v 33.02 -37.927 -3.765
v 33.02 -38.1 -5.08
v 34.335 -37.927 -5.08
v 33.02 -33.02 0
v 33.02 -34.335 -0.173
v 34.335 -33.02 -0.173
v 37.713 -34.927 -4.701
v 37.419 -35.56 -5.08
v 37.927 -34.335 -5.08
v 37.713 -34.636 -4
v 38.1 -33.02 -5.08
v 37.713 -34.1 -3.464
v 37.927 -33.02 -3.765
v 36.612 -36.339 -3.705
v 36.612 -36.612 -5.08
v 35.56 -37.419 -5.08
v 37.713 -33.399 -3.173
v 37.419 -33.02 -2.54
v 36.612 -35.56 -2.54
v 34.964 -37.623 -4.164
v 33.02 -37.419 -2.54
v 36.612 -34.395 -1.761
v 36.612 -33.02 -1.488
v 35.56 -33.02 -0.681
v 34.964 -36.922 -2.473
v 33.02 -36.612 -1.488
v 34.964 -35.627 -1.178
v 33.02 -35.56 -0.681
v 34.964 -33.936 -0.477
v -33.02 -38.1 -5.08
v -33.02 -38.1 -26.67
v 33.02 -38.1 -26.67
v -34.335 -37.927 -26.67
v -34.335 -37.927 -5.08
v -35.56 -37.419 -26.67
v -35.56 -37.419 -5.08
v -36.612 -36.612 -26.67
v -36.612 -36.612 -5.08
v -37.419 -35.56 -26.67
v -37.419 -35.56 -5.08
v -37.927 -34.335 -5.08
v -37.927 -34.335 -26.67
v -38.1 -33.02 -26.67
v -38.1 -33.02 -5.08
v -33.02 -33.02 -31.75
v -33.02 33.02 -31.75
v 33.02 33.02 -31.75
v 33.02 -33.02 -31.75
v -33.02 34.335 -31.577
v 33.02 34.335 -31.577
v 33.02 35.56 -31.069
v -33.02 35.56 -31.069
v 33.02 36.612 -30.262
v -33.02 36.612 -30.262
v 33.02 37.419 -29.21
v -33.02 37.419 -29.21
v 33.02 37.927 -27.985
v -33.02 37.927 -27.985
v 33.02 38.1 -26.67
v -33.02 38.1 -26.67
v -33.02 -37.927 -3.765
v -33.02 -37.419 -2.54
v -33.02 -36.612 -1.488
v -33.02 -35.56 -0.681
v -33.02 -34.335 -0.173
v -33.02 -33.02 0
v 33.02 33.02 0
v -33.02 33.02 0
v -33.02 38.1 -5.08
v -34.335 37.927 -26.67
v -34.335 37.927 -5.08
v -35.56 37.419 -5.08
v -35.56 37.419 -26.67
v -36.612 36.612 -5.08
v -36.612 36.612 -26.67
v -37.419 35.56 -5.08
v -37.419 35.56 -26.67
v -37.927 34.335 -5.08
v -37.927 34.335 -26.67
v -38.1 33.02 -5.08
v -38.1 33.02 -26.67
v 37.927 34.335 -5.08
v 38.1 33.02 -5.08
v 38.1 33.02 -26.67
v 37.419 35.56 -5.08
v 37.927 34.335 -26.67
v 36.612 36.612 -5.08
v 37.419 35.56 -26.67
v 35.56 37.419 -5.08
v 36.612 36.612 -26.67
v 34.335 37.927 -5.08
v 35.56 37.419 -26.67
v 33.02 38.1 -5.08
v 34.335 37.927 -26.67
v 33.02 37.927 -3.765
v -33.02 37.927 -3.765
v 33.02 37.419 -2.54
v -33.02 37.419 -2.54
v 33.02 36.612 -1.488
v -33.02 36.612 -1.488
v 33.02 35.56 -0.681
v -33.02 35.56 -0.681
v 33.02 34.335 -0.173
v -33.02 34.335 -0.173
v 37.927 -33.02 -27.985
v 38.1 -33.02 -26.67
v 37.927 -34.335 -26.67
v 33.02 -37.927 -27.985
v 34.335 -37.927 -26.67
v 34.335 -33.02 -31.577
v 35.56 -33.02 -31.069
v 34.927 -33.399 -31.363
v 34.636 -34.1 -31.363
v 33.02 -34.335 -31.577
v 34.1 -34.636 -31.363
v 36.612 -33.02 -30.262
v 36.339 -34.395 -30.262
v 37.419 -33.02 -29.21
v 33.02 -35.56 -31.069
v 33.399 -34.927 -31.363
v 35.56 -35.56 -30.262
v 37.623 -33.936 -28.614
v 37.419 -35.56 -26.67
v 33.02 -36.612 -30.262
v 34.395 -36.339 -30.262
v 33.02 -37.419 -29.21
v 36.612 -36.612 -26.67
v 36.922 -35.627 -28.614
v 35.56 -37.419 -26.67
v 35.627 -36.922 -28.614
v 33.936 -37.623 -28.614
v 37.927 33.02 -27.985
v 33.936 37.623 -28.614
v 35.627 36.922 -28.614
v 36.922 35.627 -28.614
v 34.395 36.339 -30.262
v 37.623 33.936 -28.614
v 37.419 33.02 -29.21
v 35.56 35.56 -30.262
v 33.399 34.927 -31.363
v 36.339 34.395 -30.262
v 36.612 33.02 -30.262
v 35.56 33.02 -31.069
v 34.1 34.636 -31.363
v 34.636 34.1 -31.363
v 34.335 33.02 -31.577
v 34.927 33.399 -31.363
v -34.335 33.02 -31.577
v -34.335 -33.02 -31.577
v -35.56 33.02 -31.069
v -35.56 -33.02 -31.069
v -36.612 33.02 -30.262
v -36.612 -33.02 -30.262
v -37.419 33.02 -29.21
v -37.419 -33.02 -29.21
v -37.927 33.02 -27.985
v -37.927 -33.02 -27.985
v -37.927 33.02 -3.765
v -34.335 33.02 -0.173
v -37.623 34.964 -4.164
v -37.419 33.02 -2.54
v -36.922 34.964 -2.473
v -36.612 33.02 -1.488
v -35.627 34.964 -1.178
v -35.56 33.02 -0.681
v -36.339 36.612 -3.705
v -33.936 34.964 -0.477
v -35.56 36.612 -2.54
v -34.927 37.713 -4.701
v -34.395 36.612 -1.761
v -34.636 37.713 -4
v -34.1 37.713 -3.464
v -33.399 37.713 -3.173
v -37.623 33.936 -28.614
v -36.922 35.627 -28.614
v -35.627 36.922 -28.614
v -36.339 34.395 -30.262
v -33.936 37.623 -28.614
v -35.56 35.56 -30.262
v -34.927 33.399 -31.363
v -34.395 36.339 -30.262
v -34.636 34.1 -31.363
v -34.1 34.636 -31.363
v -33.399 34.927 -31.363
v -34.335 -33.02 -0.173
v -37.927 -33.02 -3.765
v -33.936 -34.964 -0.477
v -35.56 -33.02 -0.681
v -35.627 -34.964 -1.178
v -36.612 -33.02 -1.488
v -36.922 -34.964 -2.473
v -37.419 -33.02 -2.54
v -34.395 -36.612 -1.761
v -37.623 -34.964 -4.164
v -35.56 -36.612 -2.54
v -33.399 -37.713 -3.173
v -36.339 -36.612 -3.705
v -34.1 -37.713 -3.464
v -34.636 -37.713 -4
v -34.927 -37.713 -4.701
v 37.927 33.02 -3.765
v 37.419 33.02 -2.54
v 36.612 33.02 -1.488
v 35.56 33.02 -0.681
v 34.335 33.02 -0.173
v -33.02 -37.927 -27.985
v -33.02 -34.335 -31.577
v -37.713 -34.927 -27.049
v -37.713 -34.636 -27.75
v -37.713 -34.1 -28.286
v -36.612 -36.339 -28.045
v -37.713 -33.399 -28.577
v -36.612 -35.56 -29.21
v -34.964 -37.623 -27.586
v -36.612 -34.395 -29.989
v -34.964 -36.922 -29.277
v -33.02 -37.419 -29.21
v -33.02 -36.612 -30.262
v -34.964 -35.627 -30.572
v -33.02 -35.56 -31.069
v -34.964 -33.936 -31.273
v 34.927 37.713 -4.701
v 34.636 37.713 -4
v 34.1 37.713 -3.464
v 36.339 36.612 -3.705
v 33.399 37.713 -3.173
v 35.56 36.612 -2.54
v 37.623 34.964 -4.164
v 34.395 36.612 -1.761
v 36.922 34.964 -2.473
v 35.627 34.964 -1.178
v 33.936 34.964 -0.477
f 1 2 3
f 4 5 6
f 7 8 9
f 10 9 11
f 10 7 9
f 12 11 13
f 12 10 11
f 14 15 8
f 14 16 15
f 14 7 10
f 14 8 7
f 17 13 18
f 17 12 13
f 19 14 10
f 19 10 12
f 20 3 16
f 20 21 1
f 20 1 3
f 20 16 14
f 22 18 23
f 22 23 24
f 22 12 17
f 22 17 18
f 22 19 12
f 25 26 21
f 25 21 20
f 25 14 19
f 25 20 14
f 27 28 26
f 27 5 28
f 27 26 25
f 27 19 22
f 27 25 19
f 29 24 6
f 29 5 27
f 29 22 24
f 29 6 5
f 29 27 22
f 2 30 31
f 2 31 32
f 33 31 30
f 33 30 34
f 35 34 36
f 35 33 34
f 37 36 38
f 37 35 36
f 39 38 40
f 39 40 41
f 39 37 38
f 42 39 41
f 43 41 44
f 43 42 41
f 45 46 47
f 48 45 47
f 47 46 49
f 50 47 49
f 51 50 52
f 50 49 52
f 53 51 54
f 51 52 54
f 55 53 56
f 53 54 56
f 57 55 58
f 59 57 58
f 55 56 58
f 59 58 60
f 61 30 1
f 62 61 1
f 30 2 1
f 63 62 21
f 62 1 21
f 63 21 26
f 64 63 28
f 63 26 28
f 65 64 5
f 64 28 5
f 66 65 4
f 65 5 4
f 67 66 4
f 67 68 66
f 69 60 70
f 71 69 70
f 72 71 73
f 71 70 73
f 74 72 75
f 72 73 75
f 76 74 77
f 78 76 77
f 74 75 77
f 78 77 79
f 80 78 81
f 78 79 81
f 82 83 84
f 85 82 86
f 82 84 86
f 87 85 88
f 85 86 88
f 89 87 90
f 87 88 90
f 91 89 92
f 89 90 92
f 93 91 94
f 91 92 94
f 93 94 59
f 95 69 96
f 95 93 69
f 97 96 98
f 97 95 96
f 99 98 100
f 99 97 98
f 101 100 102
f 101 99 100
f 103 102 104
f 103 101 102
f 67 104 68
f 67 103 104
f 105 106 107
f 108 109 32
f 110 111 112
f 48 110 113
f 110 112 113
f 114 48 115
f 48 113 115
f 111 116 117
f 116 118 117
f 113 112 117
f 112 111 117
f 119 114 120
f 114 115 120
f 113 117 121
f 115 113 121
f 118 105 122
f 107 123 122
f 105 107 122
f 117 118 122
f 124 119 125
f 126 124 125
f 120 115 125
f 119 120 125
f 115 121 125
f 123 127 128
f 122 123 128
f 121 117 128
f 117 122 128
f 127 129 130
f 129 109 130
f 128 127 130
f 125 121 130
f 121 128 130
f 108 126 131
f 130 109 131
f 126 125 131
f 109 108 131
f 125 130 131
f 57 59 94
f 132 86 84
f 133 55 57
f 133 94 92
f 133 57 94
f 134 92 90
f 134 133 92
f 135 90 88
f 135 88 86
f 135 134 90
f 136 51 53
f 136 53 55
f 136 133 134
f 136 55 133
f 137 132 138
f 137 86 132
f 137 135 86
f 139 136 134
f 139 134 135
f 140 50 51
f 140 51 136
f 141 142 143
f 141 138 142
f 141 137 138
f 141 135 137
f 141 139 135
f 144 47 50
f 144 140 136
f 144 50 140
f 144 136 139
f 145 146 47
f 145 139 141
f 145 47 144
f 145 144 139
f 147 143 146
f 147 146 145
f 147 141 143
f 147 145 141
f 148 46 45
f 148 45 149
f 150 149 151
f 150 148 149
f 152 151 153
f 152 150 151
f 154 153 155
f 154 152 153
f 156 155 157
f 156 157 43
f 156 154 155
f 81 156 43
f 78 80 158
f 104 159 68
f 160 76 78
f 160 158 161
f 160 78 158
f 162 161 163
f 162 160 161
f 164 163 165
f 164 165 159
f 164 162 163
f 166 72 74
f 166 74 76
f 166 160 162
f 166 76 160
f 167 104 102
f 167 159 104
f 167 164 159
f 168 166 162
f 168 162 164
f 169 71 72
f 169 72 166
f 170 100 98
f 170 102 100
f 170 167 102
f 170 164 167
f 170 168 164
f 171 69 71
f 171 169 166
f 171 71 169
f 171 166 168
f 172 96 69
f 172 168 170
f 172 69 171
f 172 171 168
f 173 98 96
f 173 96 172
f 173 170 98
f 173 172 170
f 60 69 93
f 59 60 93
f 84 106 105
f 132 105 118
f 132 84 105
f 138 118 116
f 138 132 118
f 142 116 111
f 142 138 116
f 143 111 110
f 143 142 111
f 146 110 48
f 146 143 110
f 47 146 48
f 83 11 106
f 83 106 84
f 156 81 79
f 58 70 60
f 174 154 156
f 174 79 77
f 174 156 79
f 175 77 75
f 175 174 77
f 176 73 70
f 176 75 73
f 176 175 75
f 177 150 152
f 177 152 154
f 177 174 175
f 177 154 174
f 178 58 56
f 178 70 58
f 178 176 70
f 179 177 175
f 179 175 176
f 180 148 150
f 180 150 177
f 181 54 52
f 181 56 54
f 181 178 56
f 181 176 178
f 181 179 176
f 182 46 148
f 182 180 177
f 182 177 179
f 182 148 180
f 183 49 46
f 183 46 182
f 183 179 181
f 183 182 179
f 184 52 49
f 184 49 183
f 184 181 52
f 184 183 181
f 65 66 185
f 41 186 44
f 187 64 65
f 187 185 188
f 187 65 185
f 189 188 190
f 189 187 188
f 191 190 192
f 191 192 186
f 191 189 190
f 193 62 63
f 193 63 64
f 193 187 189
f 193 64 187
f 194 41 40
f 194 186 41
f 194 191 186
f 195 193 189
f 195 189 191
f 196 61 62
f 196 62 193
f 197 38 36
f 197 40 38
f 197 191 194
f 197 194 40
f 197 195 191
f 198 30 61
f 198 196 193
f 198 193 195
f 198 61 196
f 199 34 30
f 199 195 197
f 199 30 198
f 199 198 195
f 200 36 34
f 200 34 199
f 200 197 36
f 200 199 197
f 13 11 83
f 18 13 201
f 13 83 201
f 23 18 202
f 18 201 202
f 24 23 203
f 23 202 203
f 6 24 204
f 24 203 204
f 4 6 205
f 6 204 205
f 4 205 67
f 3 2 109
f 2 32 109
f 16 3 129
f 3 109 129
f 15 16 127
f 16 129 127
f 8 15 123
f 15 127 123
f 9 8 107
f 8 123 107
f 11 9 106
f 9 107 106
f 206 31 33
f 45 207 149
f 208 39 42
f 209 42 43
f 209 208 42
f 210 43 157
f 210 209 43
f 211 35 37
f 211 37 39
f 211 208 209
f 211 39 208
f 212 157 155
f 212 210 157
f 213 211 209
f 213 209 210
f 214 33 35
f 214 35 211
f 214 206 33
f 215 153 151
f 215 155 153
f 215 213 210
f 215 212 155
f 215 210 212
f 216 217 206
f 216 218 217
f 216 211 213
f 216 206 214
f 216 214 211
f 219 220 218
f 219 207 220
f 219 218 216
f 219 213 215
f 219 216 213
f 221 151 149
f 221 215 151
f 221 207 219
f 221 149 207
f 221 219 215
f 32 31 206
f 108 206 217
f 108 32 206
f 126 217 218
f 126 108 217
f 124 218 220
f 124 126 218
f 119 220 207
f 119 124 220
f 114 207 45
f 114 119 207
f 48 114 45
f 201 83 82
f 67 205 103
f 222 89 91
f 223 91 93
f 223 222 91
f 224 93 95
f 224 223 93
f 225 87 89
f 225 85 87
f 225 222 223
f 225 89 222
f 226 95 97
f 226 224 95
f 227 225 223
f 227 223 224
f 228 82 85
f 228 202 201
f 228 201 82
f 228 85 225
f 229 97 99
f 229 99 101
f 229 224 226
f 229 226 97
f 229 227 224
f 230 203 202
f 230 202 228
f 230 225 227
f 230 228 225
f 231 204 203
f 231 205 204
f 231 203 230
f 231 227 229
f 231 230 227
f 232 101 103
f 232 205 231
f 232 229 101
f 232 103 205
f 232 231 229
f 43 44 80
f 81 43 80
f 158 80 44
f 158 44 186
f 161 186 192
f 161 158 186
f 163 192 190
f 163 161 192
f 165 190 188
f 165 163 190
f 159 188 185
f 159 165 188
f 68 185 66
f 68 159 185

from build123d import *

# Parameters (mm, degrees)
F0_W         = 76.2
F0_H         = 76.2
F1_DEPTH     = 31.75
F2_R         = 5.08
F3_T1_DEPTH  = 66.04
F3_T3_DEPTH  = 21.59
F3_T5_DEPTH  = 66.04
F3_S9_W      = 5.08
F3_S9_H      = 5.08
F3_T10_DEPTH = 5.08
F3_S15_W     = 5.08
F3_S15_H     = 5.08
F3_T16_DEPTH = 5.08
F3_S21_W     = 5.08
F3_S21_H     = 5.08
F3_T22_DEPTH = 5.08
F3_S27_W     = 5.08
F3_S27_H     = 5.08
F3_T28_DEPTH = 5.08
F3_T32_ANGLE = 90


# Not quite as in the source:
# - a fillet or chamfer that OpenCascade refuses, or shapes differently, is made with other operations: its cross-section is extruded or revolved along the edge and cut away or added


with BuildPart() as f1:
    # F0 (on Top) → F1 (new body)
    with BuildSketch(Plane.XY):
        Rectangle(F0_W, F0_H)
    extrude(amount=-F1_DEPTH)

    # F2
    f2_edges = [f1.edges().sort_by_distance(p)[0] for p in [
        (0, -38.1, 0),
        (38.1, -38.1, -15.875),
        (38.1, 0, 0),
        (38.1, 38.1, -15.875),
        (38.1, 0, -31.75),
        (0, -38.1, -31.75),
        (-38.1, 0, 0),
        (0, 38.1, 0),
    ]]
    fillet(f2_edges, radius=F2_R)

    # F3: fillet of radius 5.08 on 5 edges, made by hand

    # F3_s2 → F3_t1 (cut)
    with BuildSketch(Plane.YZ.offset(-33.02)):
        with BuildLine():
            ThreePointArc((33.02, -31.75), (36.6121024484, -30.2621024484), (38.1, -26.67))
            Line((38.1, -26.67), (38.1, -31.75))
            Line((38.1, -31.75), (33.02, -31.75))
        make_face()
    extrude(amount=F3_T1_DEPTH, mode=Mode.SUBTRACT)

    # F3_s4 → F3_t3 (cut)
    with BuildSketch(Plane.XY.offset(-26.67)):
        with BuildLine():
            ThreePointArc((-33.02, 38.1), (-36.6121024484, 36.6121024484), (-38.1, 33.02))
            Line((-38.1, 33.02), (-38.1, 38.1))
            Line((-38.1, 38.1), (-33.02, 38.1))
        make_face()
        with BuildLine():
            ThreePointArc((-33.02, -38.1), (-36.6121024484, -36.6121024484), (-38.1, -33.02))
            Line((-38.1, -33.02), (-38.1, -38.1))
            Line((-38.1, -38.1), (-33.02, -38.1))
        make_face()
    extrude(amount=F3_T3_DEPTH, mode=Mode.SUBTRACT)

    # F3_s6 → F3_t5 (cut)
    with BuildSketch(Plane.XZ.offset(-33.02)):
        with BuildLine():
            ThreePointArc((-33.02, -31.75), (-36.6121024484, -30.2621024484), (-38.1, -26.67))
            Line((-38.1, -26.67), (-38.1, -31.75))
            Line((-38.1, -31.75), (-33.02, -31.75))
        make_face()
    extrude(amount=F3_T5_DEPTH, mode=Mode.SUBTRACT)


with BuildPart() as f3_tool8:
    # F3_s9 → F3_t10 (new body)
    with BuildSketch(Plane.XZ.offset(33.02)):
        with Locations((-35.56, -2.54)):
            Rectangle(F3_S9_W, F3_S9_H)
    extrude(amount=F3_T10_DEPTH)

    # F3_s11 → F3_t12 (revolve, cut)
    with BuildSketch(Plane(origin=(-33.02, -33.02, -5.08), x_dir=(0.7071067812, 0, -0.7071067812), z_dir=(-0.7071067812, 0, -0.7071067812))):
        with BuildLine():
            ThreePointArc((0, -5.08), (5.08, 0), (0, 5.08))
            Line((0, 5.08), (0, -5.08))
        make_face()
    revolve(axis=Axis((-33.02, -33.02, -5.08), (0, -1, 0)), mode=Mode.SUBTRACT)


with BuildPart() as f1_1:
    add(f1.part)

    # F3_t7: cut F3_tool8
    add(f3_tool8.part, mode=Mode.SUBTRACT)


with BuildPart() as f3_tool14:
    # F3_s15 → F3_t16 (new body)
    with BuildSketch(Plane.XZ.offset(-33.02)):
        with Locations((-35.56, -2.54)):
            Rectangle(F3_S15_W, F3_S15_H)
    extrude(amount=-F3_T16_DEPTH)

    # F3_s17 → F3_t18 (revolve, cut)
    with BuildSketch(Plane(origin=(-33.02, 33.02, -5.08), x_dir=(0.7071067812, 0, -0.7071067812), z_dir=(0.7071067812, 0, 0.7071067812))):
        with BuildLine():
            ThreePointArc((0, -5.08), (5.08, 0), (0, 5.08))
            Line((0, 5.08), (0, -5.08))
        make_face()
    revolve(axis=Axis((-33.02, 33.02, -5.08), (0, 1, 0)), mode=Mode.SUBTRACT)


with BuildPart() as f1_2:
    add(f1_1.part)

    # F3_t13: cut F3_tool14
    add(f3_tool14.part, mode=Mode.SUBTRACT)


with BuildPart() as f3_tool20:
    # F3_s21 → F3_t22 (new body)
    with BuildSketch(Plane.XY.offset(-26.67)):
        with Locations((35.56, 35.56)):
            Rectangle(F3_S21_W, F3_S21_H)
    extrude(amount=-F3_T22_DEPTH)

    # F3_s23 → F3_t24 (revolve, cut)
    with BuildSketch(Plane(origin=(33.02, 33.02, -26.67), x_dir=(-0.7071067812, -0.7071067812, 0), z_dir=(0.7071067812, -0.7071067812, 0))):
        with BuildLine():
            ThreePointArc((0, -5.08), (5.08, 0), (0, 5.08))
            Line((0, 5.08), (0, -5.08))
        make_face()
    revolve(axis=Axis((33.02, 33.02, -26.67), (0, 0, -1)), mode=Mode.SUBTRACT)


with BuildPart() as f1_3:
    add(f1_2.part)

    # F3_t19: cut F3_tool20
    add(f3_tool20.part, mode=Mode.SUBTRACT)


with BuildPart() as f3_tool26:
    # F3_s27 → F3_t28 (new body)
    with BuildSketch(Plane.XY.offset(-26.67)):
        with Locations((-35.56, 35.56)):
            Rectangle(F3_S27_W, F3_S27_H)
    extrude(amount=-F3_T28_DEPTH)

    # F3_s29 → F3_t30 (revolve, cut)
    with BuildSketch(Plane(origin=(-33.02, 33.02, -26.67), x_dir=(0.7071067812, -0.7071067812, 0), z_dir=(0.7071067812, 0.7071067812, 0))):
        with BuildLine():
            ThreePointArc((0, -5.08), (5.08, 0), (0, 5.08))
            Line((0, 5.08), (0, -5.08))
        make_face()
    revolve(axis=Axis((-33.02, 33.02, -26.67), (0, 0, -1)), mode=Mode.SUBTRACT)


with BuildPart() as f1_4:
    add(f1_3.part)

    # F3_t25: cut F3_tool26
    add(f3_tool26.part, mode=Mode.SUBTRACT)

    # F3_s31 → F3_t32 (revolve, cut)
    with BuildSketch(Plane.XY.offset(-26.67)):
        with BuildLine():
            ThreePointArc((-38.1, -33.02), (-36.6121024484, -36.6121024484), (-33.02, -38.1))
            Line((-33.02, -38.1), (-38.1, -38.1))
            Line((-38.1, -38.1), (-38.1, -33.02))
        make_face()
    revolve(axis=Axis((-38.1, -33.02, -26.67), (1, 0, 0)), revolution_arc=F3_T32_ANGLE, mode=Mode.SUBTRACT)


solid = f1_4.part
